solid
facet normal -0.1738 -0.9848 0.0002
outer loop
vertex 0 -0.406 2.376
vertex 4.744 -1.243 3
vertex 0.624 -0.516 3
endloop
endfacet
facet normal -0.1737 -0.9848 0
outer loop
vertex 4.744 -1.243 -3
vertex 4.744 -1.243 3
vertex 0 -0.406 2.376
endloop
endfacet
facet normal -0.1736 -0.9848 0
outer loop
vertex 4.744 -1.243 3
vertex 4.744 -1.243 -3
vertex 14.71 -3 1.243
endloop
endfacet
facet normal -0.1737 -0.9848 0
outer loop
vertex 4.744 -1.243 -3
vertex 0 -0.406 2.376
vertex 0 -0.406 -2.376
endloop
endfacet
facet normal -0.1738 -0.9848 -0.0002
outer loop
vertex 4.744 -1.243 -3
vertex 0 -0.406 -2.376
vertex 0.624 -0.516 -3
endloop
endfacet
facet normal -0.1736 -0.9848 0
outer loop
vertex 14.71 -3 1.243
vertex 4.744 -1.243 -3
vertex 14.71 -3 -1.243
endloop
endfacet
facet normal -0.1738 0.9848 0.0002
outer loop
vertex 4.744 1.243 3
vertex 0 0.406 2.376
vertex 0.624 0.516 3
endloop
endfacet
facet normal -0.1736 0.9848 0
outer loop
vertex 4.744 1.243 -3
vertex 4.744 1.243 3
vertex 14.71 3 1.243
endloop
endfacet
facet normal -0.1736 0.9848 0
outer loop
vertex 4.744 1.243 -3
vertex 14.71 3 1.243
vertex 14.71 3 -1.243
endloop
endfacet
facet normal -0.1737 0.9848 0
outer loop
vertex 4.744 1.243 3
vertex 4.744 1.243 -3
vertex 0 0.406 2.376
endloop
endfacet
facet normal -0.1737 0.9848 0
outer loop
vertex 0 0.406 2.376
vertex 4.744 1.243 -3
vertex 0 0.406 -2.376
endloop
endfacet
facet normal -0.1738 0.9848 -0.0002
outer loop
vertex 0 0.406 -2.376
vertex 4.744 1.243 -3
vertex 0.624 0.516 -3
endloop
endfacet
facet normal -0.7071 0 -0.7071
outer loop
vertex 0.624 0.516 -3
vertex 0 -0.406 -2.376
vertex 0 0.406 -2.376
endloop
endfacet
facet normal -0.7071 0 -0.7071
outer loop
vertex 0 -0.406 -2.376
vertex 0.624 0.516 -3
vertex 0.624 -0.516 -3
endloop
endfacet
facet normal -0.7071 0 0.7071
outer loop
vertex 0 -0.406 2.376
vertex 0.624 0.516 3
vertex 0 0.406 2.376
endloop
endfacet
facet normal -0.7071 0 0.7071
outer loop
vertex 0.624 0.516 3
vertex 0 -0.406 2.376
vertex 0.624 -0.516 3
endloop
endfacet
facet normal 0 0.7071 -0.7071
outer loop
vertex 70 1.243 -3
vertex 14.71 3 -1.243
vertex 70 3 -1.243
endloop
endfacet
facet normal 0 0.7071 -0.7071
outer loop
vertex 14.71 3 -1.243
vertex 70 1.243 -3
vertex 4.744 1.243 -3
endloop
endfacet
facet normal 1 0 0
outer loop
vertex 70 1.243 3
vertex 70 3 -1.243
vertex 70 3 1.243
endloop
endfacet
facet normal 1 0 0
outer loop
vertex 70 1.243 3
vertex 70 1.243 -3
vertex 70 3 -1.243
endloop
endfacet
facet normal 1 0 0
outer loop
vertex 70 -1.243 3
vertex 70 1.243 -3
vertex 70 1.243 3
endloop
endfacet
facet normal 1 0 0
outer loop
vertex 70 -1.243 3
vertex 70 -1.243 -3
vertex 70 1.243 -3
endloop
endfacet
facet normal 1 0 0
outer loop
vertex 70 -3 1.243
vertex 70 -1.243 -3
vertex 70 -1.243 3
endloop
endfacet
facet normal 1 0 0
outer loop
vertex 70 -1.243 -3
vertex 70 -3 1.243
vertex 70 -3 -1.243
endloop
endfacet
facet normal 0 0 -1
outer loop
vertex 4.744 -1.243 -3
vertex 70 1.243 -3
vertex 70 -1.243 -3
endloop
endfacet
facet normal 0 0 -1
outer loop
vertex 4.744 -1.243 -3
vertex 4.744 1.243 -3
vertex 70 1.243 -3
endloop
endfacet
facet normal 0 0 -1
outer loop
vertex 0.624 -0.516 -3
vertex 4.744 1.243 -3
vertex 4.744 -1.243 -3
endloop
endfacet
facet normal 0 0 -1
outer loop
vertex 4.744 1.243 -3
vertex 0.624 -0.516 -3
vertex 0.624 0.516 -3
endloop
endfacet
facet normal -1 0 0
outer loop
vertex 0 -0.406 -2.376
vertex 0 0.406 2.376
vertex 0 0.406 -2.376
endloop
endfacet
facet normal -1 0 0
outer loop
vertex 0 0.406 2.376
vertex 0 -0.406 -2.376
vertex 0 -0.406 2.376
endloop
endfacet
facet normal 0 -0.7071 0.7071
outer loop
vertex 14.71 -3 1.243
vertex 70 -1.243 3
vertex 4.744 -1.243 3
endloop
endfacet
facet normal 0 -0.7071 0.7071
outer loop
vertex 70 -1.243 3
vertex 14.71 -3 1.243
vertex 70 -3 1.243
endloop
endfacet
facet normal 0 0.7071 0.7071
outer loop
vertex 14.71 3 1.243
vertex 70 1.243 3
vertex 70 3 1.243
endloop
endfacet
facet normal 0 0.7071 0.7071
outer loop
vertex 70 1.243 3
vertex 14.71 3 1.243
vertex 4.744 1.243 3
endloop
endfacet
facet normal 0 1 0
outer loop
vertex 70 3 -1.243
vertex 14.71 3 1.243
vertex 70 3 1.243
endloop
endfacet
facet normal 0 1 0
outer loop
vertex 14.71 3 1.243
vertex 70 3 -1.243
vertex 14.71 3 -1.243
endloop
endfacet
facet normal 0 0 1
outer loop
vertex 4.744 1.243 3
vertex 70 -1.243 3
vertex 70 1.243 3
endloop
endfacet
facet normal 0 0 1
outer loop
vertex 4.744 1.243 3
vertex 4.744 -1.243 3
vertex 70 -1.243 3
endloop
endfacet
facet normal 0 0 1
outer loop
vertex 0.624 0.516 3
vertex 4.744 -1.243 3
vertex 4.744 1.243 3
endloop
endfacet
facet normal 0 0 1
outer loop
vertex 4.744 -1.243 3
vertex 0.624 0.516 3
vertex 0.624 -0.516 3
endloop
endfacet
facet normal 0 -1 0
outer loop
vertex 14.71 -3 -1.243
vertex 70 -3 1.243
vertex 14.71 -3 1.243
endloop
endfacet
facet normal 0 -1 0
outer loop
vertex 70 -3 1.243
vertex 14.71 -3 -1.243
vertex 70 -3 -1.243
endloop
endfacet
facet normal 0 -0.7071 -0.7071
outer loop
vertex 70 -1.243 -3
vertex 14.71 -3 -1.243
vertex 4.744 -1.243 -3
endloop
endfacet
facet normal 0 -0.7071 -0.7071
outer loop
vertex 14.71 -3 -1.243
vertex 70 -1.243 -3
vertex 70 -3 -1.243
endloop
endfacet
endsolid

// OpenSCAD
eps = 0.001;

rod_diameter = 6;
rod_length = 70;
tip_thickness = 0.8;

module octagon(diameter) {
  intersection()
  {
    square(diameter, center=true);

    rotate([0, 0, 45])
    square(diameter, center=true);
  }
}

module rod() {
  difference()
  {
    rotate([0, 90, 0])
    linear_extrude(rod_length)
    octagon(rod_diameter);

    for (a = [-1, 1])
    scale([1, a, 1])
    rotate([0, 0, 10])
    translate([0, tip_thickness/2, -10])
    cube(20);
  
    rotate([90, 0, 0])
    for (a = [-1, 1])
    scale([1, a, 1])
    rotate([0, 0, 45])
    translate([0, rod_diameter*0.28, -10])
    cube(20);
  }
}

handle_diameter = 18;

module handle() {
  $fn = 40;
  
  difference()
  {  
    hull()
    {
      linear_extrude(eps)
      octagon(handle_diameter-6);
   
      translate([0, 0, 3])
      linear_extrude(eps)
      octagon(handle_diameter);
   
      translate([0, 0, 50])
      linear_extrude(eps)
      octagon(handle_diameter);
   
      translate([0, 0, 53])
      linear_extrude(eps)
      octagon(handle_diameter-6);
    }
  
    translate([0, 0, 40])
    rotate_extrude()
    translate([17.5, 0])
    circle(10);
    
    translate([0, 0, 43+2*eps])
    linear_extrude(10)
    octagon(rod_diameter + 0.2);
  }
}

rod();
